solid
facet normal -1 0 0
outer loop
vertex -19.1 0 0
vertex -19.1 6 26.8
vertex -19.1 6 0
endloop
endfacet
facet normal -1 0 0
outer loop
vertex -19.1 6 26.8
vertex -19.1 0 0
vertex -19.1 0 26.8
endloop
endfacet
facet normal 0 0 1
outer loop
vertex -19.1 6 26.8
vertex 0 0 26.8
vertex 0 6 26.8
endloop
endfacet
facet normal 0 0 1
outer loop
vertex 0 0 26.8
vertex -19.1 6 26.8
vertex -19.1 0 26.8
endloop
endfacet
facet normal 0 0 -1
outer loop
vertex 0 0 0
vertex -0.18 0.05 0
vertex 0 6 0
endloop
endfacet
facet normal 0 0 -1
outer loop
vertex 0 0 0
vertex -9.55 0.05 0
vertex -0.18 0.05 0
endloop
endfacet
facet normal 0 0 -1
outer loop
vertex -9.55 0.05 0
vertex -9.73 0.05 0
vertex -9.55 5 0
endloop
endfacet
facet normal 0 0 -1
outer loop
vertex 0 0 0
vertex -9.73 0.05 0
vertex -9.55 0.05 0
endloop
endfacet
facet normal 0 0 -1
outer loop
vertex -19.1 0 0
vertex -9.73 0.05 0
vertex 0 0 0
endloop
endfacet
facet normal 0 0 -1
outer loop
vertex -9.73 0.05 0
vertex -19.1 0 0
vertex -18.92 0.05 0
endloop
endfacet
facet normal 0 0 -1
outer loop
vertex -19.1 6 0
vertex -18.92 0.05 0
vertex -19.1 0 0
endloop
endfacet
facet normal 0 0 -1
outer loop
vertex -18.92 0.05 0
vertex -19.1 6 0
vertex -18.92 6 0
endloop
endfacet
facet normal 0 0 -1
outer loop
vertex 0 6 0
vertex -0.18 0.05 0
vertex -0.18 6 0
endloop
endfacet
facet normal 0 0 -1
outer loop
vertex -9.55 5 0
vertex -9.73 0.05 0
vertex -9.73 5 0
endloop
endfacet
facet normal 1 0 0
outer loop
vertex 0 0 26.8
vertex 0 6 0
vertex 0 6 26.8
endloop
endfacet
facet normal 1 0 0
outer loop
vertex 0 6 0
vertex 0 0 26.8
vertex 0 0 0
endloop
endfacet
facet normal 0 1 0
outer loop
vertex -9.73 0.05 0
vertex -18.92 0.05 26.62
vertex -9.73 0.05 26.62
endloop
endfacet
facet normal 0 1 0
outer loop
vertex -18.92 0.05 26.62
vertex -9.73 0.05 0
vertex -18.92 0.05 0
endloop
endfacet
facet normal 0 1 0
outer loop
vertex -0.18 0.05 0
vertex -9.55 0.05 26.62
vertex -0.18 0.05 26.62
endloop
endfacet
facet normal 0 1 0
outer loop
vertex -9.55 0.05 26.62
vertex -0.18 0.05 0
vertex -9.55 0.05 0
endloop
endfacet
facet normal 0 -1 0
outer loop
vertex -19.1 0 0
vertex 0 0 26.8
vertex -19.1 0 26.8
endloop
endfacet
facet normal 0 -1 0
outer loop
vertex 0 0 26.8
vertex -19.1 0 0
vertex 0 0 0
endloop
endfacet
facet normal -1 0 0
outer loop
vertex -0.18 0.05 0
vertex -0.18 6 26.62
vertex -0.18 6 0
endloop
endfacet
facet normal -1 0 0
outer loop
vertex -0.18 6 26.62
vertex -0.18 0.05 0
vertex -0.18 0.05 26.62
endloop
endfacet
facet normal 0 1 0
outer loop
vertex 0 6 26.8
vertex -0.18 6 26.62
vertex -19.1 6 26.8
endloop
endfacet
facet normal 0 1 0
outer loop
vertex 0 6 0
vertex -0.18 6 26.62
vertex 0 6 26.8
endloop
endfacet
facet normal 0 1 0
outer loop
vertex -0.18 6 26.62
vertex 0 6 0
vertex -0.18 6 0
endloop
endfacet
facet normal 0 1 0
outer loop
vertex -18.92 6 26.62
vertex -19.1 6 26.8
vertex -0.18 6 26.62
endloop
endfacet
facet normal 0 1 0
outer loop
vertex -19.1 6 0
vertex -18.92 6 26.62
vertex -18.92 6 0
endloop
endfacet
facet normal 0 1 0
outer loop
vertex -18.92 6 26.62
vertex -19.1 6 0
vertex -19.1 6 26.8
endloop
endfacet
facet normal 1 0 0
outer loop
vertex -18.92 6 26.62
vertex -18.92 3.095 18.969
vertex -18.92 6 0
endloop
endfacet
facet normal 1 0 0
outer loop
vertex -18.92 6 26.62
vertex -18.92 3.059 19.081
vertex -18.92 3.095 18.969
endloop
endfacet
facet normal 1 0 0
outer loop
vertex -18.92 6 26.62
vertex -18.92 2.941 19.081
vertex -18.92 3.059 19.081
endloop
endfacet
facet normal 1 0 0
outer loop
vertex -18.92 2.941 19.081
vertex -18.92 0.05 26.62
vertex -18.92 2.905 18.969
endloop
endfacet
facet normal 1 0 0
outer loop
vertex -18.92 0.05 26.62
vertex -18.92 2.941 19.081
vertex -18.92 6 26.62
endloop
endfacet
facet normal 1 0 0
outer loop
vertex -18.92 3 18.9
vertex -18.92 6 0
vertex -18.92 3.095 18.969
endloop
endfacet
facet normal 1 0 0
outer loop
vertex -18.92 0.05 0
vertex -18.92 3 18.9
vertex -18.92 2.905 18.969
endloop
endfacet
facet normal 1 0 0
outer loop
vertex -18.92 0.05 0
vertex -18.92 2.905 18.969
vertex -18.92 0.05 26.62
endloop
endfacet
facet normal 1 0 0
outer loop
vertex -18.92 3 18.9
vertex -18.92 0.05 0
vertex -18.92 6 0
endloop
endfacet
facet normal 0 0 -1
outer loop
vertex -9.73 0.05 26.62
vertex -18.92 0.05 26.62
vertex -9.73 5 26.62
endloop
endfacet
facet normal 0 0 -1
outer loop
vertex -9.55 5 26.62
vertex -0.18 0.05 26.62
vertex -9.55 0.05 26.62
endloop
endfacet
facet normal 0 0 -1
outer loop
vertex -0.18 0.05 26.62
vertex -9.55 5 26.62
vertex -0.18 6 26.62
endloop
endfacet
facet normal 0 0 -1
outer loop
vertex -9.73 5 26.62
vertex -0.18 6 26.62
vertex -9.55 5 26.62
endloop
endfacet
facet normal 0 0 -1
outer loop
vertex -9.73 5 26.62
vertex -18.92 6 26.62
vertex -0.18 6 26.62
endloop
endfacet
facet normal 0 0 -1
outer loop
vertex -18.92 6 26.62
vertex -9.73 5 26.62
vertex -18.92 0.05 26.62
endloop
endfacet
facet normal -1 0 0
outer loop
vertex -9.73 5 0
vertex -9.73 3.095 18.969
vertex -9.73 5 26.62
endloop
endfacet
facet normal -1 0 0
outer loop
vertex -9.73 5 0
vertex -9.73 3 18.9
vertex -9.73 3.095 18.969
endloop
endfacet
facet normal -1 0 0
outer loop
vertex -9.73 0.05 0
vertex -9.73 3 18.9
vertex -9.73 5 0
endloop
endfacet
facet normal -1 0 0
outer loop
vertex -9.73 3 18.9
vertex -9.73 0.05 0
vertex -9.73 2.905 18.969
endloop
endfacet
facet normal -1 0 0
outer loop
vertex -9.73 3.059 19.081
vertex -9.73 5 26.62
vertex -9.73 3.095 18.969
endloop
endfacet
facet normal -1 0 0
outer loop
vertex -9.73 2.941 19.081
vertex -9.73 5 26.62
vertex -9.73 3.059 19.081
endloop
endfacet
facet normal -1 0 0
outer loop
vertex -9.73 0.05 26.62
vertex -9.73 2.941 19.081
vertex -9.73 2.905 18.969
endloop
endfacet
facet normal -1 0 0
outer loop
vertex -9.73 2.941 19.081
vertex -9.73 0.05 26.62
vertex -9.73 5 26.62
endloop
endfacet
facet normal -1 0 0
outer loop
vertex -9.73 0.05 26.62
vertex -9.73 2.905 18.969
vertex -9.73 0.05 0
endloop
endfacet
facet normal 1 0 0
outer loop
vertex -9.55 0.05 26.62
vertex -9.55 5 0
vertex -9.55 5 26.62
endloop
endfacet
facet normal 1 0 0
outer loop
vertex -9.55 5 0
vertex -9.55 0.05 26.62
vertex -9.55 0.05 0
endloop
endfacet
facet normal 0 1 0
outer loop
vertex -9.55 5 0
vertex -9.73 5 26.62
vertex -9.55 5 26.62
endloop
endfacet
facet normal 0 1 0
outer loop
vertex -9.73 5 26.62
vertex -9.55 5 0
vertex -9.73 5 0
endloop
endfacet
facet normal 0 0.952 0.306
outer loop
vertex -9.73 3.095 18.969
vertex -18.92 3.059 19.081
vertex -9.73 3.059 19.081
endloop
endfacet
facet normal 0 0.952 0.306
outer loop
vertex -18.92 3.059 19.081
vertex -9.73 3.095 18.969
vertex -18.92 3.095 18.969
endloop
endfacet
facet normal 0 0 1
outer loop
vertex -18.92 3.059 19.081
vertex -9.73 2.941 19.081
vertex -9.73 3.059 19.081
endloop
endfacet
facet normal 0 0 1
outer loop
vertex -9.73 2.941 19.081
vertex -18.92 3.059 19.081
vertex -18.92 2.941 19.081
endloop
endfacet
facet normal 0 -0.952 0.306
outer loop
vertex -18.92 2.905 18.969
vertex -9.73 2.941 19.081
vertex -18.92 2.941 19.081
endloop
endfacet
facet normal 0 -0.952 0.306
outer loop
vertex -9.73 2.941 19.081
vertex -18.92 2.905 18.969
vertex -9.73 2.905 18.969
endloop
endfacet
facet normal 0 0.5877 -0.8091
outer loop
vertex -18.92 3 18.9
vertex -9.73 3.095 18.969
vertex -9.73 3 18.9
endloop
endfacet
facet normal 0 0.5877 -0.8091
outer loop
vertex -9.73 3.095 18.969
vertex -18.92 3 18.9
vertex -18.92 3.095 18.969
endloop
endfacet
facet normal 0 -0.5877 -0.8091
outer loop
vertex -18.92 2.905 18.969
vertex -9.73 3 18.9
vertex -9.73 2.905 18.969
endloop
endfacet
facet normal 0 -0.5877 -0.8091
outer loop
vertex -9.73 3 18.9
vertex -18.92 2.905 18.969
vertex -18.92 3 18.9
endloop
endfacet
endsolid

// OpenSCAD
// font size
Size = 20;

// font name, style
Font = "Consolas";

// Kern factor to pull letters tighter or further.
Kern = 0.9;

// sum the prefix of a vector.
function Sum(v, i) = i < 1?0:v[i - 1] + Sum(v, i - 1);

// given a vector of characters and a corresponding vector of character widths, draw them,
// extruding the odd ones 5 and the even ones 4.
module stagger2(chars, lens) {
    for (i = [0:len(chars) - 1]) {
        linear_extrude(4 + (i % 2)) {
            translate([Sum(lens, i), 0])text(chars[i], font = Font, size = Size);
        }
    }
}

// simple call - just pass in the string to render
module stagger(s) {
    stagger2([for (c = s)c], [for (c = s)20 * Kern]);
}

// Example usage
//stagger("Sample");


//// Find the unitary vector with direction v. Fails if v=[0,0,0].
//function unit(v) = norm(v) > 0 ? v / norm(v) : undef;
//// Find the transpose of a rectangular matrix
//function transpose(m) = // m is any rectangular matrix of objects
//    [for (j = [0:len(m[0]) - 1]) [for (i = [0:len(m) - 1]) m[i][j]]];
//// The identity matrix with dimension n
//function identity(n) = [for (i = [0:n - 1]) [for (j = [0:n - 1]) i == j ? 1 : 0]];
//
//
//function rotate_from_to(a, b) =
//let(axis = unit(cross(a, b)))
//        axis * axis >= 0.99 ?
//        transpose([unit(b), axis, cross(axis, unit(b))]) *
//            [unit(a), axis, cross(axis, unit(a))] :
//        identity(3);
//
//module line(p0, p1, diameter = 1) {
//    v = p1 - p0;
//    color([0, 0, 0]) {
//        translate(p0) {
//            // rotate the cylinder so its z axis is brought to direction v
//            multmatrix(rotate_from_to([0, 0, 1], v)) {
//                cylinder(d = diameter, h = norm(v), $fn = 4);
//            }
//        }
//    }
//}


module szafa_przedpokoj() {
    grubosc_plyty = 0.18;

    szafa_w = 18.1 + 1.;
    szafa_h = 26.8;
    szafa_d = 6.;

    plecowka_d = 0.05;
    palak_h = 19.;
    drzwi_przsowne_d = 1.;
    //    miejsce_na_odkurzacz_h = 105;
    //    miejsce_na_odkurzacz_d = 250;
    //    szuflada_h = 160;
    //    srodkowa_z = 2 * szuflada_h + miejsce_na_odkurzacz_h;
    //    miejsce_na_kurtki_h = 1600;

    //    palak_odstep_od_sufitu_h = 120;
    scale([-1., 1., 1.]){
        color([200 / 255, 200 / 255, 200 / 255]) {
            // plecówka
            cube([szafa_w, plecowka_d, szafa_h]);
            // lewa
            cube([grubosc_plyty, szafa_d, szafa_h]);
            // prawa
            translate([szafa_w - grubosc_plyty, 0, 0]) {
                cube([grubosc_plyty, szafa_d, szafa_h]);
            }
            // góra
            translate([0, 0, szafa_h - grubosc_plyty]) {
                cube([szafa_w, szafa_d, grubosc_plyty]);
            }

            // pionowy środek
            translate([szafa_w/2, 0, 0]) {
                cube([grubosc_plyty, szafa_d - drzwi_przsowne_d, szafa_h]);
            }

            // pałąk
            translate([szafa_w / 2, szafa_d / 2, palak_h]) {
                rotate([0, 90, 0]) {
                    cylinder(h = szafa_w/2, d1 = 0.2, d2 = 0.2, center = false);
                }
            }
        }
        //        // dół
        //        translate([0, miejsce_na_odkurzacz_d, miejsce_na_odkurzacz_h]) {
        //            cube([szafa_w, szafa_d - miejsce_na_odkurzacz_d, grubosc_plyty]);
        //        }
        //        // środek
        //        translate([0, miejsce_na_odkurzacz_d, srodkowa_z]) {
        //            cube([szafa_w, szafa_d - miejsce_na_odkurzacz_d, grubosc_plyty]);
        //        }
        //        // deseczka środek
        //        translate([0, szafa_d - grubosc_plyty, srodkowa_z - grubosc_plyty]) {
        //            cube([szafa_w, grubosc_plyty, 2 * grubosc_plyty]);
        //        }
        //        // front szuflad
        //        translate([0, szafa_d + sin($t * 180) * 100, miejsce_na_odkurzacz_h]) {
        //            cube([szafa_w, grubosc_plyty, szuflada_h]);
        //        }
        //        // deseczka szuflad
        //        translate([0, szafa_d - grubosc_plyty, miejsce_na_odkurzacz_h + szuflada_h - grubosc_plyty]) {
        //            cube([szafa_w, grubosc_plyty, 2 * grubosc_plyty]);
        //        }
        //    //fron szuflady 2
        //        translate([0, szafa_d + $t * 100, miejsce_na_odkurzacz_h + szuflada_h]) {
        //            cube([szafa_w, grubosc_plyty, szuflada_h]);
        //        }
        //        //         lewe drzwi
        //        translate([grubosc_plyty, szafa_d, srodkowa_z]) {
        //            rotate([0, 0, $t * 90]) {
        //                cube([szafa_w / 2 - grubosc_plyty, grubosc_plyty, miejsce_na_kurtki_h]);
        //            }
        //        }
        //        //         prawe drzwi
        //        translate([szafa_w - grubosc_plyty, szafa_d, srodkowa_z]) {
        //            rotate([0, 0, 180 - $t * 90]) {
        //                translate([0, -grubosc_plyty, 0]) {
        //                    cube([szafa_w / 2 - grubosc_plyty, grubosc_plyty, miejsce_na_kurtki_h]);
        //                }
        //            }
        //        }
        //        // gorna półka
        //        gorna_polka_gora_z = palak_h + palak_odstep_od_sufitu_h + grubosc_plyty;
        //        gorne_drzwiczki_h = szafa_h - gorna_polka_gora_z;
        //        translate([0, 0, gorna_polka_gora_z]) {
        //            cube([szafa_w, szafa_d, grubosc_plyty]);
        //        }
        //        // deseczka półka
        //        translate([0, szafa_d - grubosc_plyty, gorna_polka_gora_z - grubosc_plyty]) {
        //            cube([szafa_w, grubosc_plyty, 2 * grubosc_plyty]);
        //        }
        //        // lewe drzwiczki
        //        translate([grubosc_plyty, szafa_d, gorna_polka_gora_z]) {
        //            rotate([0, 0,  - $t * 90]) {
        //                cube([szafa_w / 2 - grubosc_plyty, grubosc_plyty, gorne_drzwiczki_h]);
        //            }
        //        }
        //        // prawe drzwiczki
        //        translate([szafa_w - grubosc_plyty, szafa_d, gorna_polka_gora_z]) {
        //            rotate([0, 0, 180 - $t * 90]) {
        //                translate([0, -grubosc_plyty, 0]) {
        //                    cube([szafa_w / 2 - grubosc_plyty, grubosc_plyty, gorne_drzwiczki_h]);
        //                }
        //            }
        //        }
        //        // pałąk
        //        translate([szafa_w / 2, szafa_d / 2, palak_h]) {
        //            rotate([0, 90, 0]) {
        //                cylinder(h = szafa_w, d1 = 20, d2 = 20, center = true);
        //            }
        //        }
    }
}
//line([0, 0, 0], [5, 23, 42]);
//line([0, 0, 0], [5, 23, 42]);

szafa_przedpokoj();
